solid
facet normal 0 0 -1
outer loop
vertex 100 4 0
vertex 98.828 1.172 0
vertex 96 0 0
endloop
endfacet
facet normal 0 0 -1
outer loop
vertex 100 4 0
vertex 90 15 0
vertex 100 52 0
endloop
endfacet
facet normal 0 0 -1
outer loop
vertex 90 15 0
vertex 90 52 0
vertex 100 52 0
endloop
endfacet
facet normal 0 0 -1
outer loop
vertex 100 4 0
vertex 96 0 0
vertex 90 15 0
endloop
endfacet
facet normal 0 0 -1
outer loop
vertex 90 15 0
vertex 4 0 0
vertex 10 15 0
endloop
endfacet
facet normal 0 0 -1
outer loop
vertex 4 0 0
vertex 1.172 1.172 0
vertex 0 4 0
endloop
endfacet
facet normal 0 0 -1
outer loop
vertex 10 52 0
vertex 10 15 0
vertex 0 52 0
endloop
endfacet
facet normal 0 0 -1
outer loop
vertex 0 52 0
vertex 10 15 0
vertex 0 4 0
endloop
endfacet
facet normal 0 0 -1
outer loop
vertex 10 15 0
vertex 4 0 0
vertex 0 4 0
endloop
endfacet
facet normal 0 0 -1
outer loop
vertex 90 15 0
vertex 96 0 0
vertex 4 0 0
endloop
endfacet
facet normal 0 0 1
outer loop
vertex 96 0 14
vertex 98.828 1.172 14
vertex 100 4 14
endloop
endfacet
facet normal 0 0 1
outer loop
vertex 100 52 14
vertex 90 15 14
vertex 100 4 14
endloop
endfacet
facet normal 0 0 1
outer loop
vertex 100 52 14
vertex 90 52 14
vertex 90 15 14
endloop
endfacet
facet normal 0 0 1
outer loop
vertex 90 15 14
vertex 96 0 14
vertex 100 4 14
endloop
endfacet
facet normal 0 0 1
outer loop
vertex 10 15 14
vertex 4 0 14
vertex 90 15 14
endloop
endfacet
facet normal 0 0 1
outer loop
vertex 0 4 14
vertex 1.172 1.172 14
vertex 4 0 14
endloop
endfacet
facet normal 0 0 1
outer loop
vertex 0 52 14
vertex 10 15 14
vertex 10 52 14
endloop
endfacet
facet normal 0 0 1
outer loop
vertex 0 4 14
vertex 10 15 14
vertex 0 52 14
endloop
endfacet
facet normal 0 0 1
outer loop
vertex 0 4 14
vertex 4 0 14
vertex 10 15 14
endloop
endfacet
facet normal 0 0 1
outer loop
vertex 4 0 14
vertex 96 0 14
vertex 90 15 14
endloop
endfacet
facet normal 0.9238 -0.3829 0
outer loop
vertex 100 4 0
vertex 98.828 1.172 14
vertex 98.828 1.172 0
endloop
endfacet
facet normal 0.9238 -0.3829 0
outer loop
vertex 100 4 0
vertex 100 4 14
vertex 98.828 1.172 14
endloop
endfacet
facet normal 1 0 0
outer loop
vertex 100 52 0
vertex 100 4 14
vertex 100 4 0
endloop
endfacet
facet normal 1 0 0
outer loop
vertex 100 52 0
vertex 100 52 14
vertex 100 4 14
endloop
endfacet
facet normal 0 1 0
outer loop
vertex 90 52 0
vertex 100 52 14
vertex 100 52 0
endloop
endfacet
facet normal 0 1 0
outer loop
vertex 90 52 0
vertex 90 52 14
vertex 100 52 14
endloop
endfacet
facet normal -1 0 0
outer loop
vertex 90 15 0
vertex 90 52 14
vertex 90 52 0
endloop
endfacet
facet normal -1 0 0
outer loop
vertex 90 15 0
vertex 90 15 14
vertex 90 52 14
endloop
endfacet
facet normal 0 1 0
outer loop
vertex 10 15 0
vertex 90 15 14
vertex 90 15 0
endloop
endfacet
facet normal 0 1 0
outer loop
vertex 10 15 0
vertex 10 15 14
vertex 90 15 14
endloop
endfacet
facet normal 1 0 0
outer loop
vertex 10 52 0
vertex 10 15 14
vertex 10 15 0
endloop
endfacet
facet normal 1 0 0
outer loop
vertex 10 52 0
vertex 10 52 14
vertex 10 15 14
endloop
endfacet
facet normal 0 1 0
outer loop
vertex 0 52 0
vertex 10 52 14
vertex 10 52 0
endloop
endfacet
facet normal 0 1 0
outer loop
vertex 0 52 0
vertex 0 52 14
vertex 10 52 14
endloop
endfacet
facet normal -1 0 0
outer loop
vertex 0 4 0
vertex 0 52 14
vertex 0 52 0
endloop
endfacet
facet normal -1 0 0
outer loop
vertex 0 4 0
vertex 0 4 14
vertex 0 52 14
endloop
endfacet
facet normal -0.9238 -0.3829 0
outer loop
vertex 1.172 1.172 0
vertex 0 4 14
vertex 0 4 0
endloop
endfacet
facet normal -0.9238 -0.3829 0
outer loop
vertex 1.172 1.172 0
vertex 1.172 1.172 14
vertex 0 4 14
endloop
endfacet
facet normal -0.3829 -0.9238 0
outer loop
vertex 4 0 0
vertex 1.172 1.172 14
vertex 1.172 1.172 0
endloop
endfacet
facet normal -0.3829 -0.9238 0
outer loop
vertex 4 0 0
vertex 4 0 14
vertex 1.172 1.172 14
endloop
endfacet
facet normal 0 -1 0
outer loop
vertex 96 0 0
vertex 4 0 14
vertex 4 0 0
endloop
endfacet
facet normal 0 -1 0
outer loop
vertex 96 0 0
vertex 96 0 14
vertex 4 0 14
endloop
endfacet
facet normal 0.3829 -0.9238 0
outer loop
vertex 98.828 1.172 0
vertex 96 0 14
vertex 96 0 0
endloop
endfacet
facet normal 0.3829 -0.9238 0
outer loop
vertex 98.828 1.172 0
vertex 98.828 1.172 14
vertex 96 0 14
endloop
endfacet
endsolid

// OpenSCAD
$fn = 32;

// ----------------------------------------------------------------------
// Heat sink frame: 100 x 52 mm frame, 10 mm walls
// ----------------------------------------------------------------------

// --- parameters (mm) ---
profile_height = 14;      // extrusion height
profile_points = 12;      // points of the closed outline

profile = [[0, 4], [1.172, 1.172], [4, 0], [96, 0], [98.828, 1.172], [100, 4], [100, 52], [90, 52], [90, 15], [10, 15], [10, 52], [0, 52]];  // single closed polygon, 12 points, counter clockwise

// --- the one profile operation ---
linear_extrude(height = profile_height) polygon(points = profile);
